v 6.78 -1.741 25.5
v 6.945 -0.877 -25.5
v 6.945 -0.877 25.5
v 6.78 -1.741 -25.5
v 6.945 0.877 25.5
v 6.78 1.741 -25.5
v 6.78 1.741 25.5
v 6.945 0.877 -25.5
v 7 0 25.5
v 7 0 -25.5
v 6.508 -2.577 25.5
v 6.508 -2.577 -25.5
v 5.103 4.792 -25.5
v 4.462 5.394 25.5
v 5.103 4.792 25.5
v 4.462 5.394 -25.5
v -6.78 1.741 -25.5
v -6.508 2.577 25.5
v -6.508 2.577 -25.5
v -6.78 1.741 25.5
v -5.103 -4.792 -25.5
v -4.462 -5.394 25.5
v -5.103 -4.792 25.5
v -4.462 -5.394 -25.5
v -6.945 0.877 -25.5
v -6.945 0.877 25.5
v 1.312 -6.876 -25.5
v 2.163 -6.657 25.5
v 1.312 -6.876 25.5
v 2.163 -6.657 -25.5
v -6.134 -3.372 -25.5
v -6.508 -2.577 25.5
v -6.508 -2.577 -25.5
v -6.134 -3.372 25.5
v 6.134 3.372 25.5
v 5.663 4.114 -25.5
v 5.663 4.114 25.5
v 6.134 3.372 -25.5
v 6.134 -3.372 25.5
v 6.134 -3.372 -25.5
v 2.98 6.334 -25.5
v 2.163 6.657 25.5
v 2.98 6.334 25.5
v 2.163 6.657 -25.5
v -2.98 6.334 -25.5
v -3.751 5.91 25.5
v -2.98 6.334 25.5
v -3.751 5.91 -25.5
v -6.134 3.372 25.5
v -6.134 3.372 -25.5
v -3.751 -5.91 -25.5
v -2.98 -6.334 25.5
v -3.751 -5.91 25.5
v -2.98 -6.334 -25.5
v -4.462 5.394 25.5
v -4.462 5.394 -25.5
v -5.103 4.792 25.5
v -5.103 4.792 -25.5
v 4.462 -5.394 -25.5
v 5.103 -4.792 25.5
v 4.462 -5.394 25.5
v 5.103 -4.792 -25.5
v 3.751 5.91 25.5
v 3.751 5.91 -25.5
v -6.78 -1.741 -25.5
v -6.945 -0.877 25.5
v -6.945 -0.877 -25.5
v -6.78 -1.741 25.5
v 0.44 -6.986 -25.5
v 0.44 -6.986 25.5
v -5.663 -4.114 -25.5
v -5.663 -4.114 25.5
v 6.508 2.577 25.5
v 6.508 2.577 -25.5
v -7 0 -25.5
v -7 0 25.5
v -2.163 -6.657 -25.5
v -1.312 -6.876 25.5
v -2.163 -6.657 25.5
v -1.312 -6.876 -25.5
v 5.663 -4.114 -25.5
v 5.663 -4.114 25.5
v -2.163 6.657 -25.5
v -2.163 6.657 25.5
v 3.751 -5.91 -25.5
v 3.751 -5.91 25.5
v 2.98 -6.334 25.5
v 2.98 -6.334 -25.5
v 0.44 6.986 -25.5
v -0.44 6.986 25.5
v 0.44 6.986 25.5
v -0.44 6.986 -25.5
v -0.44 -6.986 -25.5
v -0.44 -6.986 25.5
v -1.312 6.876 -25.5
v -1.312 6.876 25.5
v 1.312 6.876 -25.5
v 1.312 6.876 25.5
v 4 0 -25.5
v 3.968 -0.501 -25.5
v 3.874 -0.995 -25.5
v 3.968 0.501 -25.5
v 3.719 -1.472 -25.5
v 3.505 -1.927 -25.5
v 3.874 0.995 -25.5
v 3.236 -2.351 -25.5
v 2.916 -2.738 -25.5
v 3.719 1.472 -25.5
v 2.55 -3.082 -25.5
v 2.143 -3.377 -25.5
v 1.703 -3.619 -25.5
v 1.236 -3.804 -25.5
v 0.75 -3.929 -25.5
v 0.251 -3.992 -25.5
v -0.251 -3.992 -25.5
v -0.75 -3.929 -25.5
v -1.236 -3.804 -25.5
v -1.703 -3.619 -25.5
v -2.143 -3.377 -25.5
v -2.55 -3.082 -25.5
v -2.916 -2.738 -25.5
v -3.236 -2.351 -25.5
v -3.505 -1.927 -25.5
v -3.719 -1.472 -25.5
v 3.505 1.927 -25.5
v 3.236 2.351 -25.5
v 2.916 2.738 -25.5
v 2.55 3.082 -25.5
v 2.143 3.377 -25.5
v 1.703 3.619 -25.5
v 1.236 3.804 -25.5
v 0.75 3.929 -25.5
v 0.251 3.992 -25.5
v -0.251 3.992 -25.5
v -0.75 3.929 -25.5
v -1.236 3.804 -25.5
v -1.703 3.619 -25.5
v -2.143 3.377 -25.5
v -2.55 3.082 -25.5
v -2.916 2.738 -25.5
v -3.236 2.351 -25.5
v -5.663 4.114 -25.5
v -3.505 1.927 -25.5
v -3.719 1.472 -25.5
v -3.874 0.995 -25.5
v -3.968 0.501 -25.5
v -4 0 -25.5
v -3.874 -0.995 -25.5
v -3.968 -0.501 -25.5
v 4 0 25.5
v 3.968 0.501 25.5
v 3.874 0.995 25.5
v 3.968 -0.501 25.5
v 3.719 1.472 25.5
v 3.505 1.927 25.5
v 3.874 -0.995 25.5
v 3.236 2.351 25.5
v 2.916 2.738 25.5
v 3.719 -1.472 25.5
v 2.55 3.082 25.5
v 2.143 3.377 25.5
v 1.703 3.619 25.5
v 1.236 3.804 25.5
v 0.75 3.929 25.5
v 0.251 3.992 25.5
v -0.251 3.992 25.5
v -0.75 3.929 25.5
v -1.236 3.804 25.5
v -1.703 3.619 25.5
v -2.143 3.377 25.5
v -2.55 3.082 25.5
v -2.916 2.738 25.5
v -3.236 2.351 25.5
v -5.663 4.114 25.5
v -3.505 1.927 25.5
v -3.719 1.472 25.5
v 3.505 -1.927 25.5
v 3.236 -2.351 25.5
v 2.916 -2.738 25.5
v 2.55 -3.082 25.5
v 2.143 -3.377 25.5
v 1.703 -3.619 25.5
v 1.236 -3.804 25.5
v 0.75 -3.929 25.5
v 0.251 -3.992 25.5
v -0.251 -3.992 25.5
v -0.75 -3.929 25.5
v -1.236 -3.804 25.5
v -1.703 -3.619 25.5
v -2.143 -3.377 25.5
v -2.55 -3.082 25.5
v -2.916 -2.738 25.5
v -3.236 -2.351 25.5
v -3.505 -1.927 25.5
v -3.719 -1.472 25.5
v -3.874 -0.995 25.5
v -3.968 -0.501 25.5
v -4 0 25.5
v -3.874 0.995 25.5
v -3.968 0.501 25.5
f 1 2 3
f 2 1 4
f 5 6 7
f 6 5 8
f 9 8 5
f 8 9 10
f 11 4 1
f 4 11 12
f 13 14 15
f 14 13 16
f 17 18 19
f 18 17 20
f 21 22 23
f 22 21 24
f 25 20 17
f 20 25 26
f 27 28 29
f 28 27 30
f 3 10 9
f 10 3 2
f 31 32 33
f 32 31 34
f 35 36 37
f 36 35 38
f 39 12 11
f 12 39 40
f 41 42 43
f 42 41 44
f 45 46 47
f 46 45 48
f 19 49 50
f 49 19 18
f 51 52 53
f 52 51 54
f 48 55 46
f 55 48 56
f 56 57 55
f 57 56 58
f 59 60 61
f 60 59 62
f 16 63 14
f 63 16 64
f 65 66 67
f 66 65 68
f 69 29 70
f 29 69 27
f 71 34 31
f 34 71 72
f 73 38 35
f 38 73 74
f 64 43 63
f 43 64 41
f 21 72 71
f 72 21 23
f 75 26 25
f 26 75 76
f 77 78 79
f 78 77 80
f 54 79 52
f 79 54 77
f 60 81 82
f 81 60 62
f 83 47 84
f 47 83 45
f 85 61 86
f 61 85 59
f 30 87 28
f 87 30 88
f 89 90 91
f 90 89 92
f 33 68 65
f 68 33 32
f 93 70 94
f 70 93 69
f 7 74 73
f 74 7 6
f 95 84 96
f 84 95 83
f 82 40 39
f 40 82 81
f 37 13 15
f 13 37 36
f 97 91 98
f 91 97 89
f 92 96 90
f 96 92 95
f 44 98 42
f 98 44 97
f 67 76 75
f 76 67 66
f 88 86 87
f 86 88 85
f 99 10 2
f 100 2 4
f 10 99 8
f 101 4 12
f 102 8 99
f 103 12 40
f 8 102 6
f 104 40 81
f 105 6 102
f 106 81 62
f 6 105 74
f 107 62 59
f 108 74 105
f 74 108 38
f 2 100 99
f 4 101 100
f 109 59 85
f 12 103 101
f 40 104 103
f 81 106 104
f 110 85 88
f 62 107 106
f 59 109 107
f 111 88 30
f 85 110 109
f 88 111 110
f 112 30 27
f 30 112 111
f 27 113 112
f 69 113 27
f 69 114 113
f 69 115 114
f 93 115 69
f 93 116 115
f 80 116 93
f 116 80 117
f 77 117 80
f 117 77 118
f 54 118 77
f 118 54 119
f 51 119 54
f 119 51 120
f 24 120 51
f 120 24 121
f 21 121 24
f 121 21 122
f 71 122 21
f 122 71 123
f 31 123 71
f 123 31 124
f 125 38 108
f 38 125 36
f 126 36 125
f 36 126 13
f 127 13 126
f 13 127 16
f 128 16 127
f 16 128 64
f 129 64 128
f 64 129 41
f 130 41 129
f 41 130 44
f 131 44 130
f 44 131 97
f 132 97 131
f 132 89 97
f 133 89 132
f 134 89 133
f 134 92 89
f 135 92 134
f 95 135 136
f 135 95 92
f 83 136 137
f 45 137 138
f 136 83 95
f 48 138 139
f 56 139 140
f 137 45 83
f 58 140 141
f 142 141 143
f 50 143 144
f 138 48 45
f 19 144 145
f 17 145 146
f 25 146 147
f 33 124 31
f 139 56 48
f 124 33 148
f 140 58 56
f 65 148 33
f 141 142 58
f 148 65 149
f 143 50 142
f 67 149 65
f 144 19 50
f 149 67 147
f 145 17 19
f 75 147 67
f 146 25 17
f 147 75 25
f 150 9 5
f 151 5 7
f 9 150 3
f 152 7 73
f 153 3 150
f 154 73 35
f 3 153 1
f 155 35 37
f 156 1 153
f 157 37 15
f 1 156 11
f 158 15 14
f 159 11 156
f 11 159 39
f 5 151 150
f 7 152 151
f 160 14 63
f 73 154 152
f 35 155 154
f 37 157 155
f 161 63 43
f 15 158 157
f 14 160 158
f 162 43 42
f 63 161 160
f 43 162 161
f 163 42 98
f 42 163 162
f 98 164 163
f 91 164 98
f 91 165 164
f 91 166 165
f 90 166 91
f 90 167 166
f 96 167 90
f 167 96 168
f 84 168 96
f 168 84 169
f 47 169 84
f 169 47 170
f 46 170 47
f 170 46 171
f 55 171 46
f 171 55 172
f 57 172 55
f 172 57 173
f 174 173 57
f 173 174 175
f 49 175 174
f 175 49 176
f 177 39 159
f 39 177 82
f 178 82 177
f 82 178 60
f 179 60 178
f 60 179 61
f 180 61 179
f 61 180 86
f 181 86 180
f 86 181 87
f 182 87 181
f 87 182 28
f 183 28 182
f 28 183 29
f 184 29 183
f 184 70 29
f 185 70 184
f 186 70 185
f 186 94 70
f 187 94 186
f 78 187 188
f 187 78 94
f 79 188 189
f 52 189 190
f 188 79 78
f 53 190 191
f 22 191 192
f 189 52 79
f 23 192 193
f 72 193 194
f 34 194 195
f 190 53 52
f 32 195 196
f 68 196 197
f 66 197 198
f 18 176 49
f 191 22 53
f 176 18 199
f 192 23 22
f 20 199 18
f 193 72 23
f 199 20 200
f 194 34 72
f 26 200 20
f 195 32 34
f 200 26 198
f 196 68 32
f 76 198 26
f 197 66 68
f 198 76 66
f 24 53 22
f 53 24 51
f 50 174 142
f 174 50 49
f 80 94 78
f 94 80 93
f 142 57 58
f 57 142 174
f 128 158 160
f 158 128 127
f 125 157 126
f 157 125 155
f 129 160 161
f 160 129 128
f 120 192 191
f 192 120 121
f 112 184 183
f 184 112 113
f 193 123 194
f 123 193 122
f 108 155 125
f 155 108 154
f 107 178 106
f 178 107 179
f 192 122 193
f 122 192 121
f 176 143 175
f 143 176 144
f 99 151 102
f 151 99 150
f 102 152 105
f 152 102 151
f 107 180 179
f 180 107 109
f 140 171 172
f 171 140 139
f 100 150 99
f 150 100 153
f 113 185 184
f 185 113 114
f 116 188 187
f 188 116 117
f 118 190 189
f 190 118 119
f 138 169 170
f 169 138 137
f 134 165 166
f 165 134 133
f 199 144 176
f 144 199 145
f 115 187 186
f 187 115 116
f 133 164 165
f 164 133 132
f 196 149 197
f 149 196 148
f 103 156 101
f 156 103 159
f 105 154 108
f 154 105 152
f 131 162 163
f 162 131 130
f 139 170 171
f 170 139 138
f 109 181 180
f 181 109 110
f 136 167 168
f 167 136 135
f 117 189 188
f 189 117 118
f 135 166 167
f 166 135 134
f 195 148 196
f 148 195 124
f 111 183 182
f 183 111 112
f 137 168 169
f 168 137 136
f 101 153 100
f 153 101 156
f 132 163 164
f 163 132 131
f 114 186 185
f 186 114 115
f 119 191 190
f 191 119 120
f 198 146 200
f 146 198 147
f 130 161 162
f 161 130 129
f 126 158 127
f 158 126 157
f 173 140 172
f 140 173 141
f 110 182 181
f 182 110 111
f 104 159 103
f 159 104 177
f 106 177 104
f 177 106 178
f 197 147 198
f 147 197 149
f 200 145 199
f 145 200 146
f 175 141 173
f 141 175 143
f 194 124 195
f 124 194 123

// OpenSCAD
$fn = 50;


difference() {
	union() {
		translate(v = [0, 0, -25.5000000000]) {
			cylinder(h = 51, r = 7.0000000000);
		}
	}
	union() {
		translate(v = [0, 0, -100.0000000000]) {
			cylinder(h = 200, r = 4.0000000000);
		}
	}
}
